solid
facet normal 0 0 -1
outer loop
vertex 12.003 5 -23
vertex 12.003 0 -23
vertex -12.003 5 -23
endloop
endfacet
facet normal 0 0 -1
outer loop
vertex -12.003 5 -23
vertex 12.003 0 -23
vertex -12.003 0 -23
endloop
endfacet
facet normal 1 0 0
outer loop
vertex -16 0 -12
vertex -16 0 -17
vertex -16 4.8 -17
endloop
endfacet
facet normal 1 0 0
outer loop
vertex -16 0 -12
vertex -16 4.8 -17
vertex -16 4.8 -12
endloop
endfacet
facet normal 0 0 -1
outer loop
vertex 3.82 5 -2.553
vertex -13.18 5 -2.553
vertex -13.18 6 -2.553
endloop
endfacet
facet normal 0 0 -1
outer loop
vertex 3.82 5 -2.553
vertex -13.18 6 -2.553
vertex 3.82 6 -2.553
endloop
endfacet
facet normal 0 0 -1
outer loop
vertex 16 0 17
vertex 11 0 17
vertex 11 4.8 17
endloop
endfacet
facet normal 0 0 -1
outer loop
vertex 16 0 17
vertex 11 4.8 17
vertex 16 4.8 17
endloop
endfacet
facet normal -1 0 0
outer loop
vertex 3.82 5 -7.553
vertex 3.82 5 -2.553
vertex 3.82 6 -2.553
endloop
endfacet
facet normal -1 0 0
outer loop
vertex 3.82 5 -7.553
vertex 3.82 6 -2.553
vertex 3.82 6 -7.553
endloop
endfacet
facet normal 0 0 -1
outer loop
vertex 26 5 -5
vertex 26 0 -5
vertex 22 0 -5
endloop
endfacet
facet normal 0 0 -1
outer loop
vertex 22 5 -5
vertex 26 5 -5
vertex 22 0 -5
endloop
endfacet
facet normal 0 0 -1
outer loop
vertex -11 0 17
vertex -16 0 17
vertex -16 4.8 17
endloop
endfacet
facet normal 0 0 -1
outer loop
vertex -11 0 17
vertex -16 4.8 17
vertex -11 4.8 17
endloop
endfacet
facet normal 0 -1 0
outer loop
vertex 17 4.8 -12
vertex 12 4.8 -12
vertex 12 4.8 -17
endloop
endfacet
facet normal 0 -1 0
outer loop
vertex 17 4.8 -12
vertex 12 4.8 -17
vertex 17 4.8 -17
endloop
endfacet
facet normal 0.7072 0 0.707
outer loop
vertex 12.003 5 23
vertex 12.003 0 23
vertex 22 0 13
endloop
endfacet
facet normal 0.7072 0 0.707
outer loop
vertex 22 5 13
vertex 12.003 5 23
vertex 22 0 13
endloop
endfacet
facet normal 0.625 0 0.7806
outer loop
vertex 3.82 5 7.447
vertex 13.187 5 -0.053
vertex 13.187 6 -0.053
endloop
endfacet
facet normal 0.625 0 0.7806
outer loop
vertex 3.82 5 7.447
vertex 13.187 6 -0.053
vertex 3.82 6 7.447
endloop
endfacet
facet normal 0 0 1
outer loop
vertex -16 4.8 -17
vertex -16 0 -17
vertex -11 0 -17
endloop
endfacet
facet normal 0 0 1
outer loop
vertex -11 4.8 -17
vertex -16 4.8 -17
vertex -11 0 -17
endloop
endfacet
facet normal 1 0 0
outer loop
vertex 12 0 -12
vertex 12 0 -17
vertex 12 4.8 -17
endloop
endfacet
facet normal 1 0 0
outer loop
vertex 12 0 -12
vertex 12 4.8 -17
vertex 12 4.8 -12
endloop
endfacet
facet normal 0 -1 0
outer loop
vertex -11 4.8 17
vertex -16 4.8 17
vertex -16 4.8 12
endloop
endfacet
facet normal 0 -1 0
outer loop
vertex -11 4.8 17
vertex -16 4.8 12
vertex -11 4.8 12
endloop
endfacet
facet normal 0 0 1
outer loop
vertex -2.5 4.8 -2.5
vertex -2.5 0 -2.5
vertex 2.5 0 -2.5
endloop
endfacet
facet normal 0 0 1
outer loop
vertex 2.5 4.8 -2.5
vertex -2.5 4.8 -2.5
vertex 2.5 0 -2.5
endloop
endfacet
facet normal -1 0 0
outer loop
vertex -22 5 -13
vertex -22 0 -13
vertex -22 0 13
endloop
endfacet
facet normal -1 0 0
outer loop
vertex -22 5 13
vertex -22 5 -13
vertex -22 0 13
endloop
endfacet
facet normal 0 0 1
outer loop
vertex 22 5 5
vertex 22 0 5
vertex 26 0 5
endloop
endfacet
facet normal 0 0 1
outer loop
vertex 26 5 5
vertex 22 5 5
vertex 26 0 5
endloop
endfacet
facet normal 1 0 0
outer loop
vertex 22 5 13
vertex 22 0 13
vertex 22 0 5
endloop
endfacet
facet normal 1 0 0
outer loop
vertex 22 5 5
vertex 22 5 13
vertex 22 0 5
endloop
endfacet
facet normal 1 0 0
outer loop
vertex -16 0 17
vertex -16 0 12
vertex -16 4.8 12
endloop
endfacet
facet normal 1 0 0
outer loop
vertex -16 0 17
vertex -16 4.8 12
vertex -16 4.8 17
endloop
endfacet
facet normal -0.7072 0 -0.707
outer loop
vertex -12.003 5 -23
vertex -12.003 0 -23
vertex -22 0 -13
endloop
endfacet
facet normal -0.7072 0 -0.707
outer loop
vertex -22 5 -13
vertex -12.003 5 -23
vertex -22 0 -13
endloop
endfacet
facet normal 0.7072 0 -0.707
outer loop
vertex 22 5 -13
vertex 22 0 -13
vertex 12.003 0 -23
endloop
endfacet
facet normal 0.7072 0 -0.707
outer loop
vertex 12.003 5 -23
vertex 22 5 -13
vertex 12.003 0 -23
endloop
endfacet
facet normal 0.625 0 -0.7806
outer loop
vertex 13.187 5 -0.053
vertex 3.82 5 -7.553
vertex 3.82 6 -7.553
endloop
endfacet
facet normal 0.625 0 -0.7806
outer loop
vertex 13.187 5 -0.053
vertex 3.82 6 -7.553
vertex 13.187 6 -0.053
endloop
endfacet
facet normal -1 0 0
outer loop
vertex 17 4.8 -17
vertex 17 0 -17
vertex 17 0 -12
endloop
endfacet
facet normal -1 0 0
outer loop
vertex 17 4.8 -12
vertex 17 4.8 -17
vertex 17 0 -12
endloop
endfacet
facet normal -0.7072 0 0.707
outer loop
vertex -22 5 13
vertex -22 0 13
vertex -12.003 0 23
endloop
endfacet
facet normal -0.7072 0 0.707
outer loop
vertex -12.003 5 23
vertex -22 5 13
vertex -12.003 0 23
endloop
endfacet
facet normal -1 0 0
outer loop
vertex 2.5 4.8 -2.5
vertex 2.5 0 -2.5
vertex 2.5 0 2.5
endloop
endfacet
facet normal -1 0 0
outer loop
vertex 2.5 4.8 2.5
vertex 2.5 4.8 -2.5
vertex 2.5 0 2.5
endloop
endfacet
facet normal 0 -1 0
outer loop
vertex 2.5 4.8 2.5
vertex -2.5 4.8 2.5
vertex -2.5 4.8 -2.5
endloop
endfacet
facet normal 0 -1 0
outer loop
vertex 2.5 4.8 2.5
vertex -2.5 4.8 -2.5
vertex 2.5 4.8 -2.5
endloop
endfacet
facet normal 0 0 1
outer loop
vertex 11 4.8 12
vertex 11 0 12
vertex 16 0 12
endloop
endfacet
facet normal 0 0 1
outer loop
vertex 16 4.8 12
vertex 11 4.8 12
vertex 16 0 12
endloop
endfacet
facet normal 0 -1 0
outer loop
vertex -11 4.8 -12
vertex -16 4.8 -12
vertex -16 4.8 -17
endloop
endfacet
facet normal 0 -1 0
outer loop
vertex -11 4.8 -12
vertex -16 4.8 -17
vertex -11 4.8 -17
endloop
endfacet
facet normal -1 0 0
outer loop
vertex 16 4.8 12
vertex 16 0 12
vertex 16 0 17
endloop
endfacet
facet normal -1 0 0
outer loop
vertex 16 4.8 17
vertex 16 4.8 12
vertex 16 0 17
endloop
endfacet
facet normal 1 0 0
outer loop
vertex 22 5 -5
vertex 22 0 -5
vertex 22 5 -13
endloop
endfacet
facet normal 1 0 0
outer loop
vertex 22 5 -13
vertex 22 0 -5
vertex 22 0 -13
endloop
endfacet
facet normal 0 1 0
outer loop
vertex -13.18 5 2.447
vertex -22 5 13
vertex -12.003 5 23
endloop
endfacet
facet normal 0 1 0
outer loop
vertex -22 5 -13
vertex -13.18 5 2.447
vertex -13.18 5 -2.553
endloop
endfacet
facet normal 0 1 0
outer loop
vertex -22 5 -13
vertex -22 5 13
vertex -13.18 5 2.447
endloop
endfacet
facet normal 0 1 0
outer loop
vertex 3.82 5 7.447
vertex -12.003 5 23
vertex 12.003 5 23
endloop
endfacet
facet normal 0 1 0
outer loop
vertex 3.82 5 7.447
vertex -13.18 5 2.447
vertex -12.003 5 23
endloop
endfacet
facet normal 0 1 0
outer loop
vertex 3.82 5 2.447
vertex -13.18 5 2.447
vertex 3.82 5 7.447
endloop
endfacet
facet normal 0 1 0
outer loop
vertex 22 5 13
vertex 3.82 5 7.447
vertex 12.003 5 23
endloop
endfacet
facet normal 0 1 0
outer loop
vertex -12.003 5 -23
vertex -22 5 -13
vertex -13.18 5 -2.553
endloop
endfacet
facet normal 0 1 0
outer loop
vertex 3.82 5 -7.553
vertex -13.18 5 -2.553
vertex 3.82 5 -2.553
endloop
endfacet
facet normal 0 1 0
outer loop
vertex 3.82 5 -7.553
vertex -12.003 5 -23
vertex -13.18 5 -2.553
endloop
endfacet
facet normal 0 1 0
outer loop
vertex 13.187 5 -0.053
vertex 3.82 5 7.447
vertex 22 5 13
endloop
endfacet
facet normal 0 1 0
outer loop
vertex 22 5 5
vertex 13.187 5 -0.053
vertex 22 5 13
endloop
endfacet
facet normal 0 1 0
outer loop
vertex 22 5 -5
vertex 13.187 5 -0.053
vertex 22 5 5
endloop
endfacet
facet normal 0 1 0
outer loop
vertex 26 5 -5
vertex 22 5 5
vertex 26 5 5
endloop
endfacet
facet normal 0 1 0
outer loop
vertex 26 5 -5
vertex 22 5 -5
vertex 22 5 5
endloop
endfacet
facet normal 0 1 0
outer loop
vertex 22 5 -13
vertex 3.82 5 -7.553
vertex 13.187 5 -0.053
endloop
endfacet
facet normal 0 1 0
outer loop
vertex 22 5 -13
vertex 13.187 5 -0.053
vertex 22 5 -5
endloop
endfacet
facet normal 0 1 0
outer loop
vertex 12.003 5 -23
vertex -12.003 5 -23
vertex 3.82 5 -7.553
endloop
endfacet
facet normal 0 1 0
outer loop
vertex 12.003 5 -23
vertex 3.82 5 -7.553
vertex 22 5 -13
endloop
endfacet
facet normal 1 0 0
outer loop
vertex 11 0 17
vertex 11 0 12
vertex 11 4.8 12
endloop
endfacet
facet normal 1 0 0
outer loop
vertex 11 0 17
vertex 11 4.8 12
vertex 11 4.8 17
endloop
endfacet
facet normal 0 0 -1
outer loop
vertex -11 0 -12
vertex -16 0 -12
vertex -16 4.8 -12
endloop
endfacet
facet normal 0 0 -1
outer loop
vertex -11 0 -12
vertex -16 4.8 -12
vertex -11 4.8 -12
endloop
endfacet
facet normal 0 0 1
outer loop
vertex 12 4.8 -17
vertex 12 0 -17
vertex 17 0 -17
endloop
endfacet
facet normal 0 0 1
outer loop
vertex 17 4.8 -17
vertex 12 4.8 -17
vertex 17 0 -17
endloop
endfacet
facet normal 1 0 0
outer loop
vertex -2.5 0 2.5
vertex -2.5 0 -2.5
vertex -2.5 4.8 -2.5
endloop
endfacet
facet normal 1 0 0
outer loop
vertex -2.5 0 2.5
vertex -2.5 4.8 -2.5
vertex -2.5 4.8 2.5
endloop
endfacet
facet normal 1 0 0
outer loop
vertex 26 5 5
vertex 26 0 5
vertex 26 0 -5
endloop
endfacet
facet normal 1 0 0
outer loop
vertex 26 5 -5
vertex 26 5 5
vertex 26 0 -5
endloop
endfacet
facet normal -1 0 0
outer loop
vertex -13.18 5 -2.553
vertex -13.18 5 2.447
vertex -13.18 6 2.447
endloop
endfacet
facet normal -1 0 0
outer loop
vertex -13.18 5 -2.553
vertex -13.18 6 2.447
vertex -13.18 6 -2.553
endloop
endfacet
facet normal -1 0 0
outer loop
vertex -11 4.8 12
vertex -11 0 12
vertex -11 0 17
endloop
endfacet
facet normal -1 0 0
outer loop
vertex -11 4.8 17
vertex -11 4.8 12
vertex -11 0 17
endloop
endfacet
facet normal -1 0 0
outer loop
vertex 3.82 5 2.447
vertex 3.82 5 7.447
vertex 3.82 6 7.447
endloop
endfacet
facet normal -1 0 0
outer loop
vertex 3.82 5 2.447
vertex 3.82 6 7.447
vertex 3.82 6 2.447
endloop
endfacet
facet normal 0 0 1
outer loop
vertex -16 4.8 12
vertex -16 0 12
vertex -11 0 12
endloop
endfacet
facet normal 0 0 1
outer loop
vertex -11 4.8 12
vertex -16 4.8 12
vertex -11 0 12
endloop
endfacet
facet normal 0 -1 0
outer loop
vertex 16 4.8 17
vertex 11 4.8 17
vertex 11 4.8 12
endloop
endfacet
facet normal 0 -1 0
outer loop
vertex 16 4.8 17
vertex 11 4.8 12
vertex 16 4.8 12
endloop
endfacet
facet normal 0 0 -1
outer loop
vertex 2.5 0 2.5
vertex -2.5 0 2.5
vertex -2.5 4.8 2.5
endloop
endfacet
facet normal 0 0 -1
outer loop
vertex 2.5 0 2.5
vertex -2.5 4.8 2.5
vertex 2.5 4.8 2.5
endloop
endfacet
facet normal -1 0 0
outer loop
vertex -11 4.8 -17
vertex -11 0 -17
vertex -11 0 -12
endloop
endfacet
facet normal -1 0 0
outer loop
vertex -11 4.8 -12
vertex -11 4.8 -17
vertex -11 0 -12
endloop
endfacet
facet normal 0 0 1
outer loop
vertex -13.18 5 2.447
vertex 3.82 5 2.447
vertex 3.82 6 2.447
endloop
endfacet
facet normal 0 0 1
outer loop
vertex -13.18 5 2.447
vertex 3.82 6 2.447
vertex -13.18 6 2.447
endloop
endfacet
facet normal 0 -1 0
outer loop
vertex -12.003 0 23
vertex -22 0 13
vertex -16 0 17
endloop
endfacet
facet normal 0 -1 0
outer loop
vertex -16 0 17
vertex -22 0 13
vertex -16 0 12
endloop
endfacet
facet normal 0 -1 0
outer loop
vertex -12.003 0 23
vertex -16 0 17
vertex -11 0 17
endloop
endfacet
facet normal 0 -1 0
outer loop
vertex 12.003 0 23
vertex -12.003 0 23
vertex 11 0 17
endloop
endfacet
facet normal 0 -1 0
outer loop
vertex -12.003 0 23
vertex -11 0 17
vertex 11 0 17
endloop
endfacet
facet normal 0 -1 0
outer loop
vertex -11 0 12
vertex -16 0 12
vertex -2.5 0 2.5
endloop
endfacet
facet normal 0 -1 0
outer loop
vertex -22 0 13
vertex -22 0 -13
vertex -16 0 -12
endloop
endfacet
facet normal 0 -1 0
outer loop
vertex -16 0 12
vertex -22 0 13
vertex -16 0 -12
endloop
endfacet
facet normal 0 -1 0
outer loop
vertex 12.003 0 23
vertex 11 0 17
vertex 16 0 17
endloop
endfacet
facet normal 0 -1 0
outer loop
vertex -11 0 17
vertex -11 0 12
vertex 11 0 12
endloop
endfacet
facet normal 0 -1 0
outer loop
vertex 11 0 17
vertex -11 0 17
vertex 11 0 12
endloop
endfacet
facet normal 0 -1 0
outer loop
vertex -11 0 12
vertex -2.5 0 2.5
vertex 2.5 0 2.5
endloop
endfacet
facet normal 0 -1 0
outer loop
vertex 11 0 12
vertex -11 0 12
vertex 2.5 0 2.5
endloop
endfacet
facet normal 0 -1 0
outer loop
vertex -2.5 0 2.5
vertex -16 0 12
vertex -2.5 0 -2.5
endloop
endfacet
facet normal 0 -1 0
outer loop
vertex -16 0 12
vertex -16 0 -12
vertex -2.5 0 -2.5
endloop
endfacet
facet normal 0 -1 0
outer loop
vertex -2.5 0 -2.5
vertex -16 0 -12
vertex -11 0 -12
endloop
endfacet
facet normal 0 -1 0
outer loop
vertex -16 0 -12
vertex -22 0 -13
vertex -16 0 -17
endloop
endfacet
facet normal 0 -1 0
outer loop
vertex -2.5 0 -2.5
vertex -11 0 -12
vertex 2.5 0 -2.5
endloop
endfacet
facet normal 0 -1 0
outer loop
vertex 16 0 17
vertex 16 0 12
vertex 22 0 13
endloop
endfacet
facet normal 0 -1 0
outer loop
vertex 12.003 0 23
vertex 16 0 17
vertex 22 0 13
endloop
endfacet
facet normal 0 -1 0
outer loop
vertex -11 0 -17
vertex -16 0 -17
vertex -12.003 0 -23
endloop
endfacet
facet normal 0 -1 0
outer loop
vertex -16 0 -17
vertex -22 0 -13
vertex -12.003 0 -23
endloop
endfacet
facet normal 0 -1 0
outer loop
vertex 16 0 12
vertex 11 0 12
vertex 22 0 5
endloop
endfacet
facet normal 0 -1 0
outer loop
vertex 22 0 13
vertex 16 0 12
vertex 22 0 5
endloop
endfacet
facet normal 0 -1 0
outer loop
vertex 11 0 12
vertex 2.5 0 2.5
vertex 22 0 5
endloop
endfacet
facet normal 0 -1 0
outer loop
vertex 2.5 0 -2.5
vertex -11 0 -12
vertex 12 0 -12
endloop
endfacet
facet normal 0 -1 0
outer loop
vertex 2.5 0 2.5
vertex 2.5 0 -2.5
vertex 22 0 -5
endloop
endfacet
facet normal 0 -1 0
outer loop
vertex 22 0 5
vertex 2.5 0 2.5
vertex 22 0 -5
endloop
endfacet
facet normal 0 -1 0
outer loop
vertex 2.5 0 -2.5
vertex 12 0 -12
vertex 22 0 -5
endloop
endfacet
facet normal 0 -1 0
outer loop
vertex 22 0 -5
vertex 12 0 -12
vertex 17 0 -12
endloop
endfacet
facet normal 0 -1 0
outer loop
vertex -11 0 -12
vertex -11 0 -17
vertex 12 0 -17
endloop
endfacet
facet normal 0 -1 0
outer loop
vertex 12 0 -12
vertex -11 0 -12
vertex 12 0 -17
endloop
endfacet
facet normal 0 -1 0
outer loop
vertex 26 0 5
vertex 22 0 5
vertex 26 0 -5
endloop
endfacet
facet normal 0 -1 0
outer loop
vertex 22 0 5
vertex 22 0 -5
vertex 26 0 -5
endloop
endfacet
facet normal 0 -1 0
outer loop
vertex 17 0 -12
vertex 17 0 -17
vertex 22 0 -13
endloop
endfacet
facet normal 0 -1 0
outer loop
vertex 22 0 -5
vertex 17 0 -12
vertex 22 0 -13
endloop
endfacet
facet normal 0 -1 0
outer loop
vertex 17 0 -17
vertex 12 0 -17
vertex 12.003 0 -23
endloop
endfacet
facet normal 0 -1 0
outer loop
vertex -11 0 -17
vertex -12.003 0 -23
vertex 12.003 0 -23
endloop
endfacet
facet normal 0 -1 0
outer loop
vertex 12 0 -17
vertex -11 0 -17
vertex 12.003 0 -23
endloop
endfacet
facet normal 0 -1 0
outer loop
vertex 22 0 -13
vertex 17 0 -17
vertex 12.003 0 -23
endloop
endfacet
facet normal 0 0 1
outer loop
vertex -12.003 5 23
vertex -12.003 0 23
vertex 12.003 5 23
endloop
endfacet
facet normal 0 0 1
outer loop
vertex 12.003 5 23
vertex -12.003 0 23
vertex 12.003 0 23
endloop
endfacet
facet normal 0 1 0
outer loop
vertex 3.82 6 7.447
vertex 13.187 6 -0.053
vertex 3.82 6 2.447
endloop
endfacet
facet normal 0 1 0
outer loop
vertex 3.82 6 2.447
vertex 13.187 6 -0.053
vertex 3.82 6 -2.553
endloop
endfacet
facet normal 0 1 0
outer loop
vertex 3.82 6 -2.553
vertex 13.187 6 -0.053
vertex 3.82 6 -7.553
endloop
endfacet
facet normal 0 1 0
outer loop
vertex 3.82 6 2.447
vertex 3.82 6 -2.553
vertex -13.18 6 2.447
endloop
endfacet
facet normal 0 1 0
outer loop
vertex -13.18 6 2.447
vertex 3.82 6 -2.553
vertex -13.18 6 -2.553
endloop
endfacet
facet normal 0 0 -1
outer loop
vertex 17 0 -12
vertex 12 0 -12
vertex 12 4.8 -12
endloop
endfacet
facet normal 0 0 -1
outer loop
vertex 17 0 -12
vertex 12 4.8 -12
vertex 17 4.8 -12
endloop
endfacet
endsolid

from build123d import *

# Parameters (mm, degrees)
BOSS_EXTRU_1_DEPTH      = 5
BOSS_EXTRU_2_DEPTH      = 1
ESQUISSE3_W             = 5
ESQUISSE3_H             = 5
ENL_V_MAT_EXTRU_1_DEPTH = 4.8


with BuildPart() as part:
    # Esquisse1 → Boss.-Extru.1 (new body)
    with BuildSketch(Plane(origin=(0, 0, 0), x_dir=(1, 0, 0), z_dir=(0, 1, 0))):
        Polygon((22, 13), (12.003020456, 23), (-12.003020456, 23), (-22, 13), (-22, -13), (-12.003020456, -23), (12.003020456, -23), (22, -13), (22, -5), (26, -5), (26, 5), (22, 5), align=None)
    extrude(amount=BOSS_EXTRU_1_DEPTH)

    # Esquisse2 → Boss.-Extru.2 (add)
    with BuildSketch(Plane(origin=(0, 5, 0), x_dir=(1, 0, 0), z_dir=(0, 1, 0))):
        Polygon((3.82, 2.552581319), (3.82, 7.552581319), (13.187496998, 0.052581319), (3.82, -7.447418681), (3.82, -2.447418681), (-13.18, -2.447418681), (-13.18, 2.552581319), align=None)
    extrude(amount=BOSS_EXTRU_2_DEPTH)

    # Esquisse3 → Enlèv. mat.-Extru.1 (cut)
    with BuildSketch(Plane.XZ):
        with Locations((-13.5, 14.5)):
            Rectangle(ESQUISSE3_W, ESQUISSE3_H)
        with Locations((-13.5, -14.5)):
            Rectangle(ESQUISSE3_W, ESQUISSE3_H)
        with Locations((14.5, -14.5)):
            Rectangle(ESQUISSE3_W, ESQUISSE3_H)
        with Locations((13.5, 14.5)):
            Rectangle(ESQUISSE3_W, ESQUISSE3_H)
        Rectangle(ESQUISSE3_W, ESQUISSE3_H)
    extrude(amount=-ENL_V_MAT_EXTRU_1_DEPTH, mode=Mode.SUBTRACT)


solid = part.part
